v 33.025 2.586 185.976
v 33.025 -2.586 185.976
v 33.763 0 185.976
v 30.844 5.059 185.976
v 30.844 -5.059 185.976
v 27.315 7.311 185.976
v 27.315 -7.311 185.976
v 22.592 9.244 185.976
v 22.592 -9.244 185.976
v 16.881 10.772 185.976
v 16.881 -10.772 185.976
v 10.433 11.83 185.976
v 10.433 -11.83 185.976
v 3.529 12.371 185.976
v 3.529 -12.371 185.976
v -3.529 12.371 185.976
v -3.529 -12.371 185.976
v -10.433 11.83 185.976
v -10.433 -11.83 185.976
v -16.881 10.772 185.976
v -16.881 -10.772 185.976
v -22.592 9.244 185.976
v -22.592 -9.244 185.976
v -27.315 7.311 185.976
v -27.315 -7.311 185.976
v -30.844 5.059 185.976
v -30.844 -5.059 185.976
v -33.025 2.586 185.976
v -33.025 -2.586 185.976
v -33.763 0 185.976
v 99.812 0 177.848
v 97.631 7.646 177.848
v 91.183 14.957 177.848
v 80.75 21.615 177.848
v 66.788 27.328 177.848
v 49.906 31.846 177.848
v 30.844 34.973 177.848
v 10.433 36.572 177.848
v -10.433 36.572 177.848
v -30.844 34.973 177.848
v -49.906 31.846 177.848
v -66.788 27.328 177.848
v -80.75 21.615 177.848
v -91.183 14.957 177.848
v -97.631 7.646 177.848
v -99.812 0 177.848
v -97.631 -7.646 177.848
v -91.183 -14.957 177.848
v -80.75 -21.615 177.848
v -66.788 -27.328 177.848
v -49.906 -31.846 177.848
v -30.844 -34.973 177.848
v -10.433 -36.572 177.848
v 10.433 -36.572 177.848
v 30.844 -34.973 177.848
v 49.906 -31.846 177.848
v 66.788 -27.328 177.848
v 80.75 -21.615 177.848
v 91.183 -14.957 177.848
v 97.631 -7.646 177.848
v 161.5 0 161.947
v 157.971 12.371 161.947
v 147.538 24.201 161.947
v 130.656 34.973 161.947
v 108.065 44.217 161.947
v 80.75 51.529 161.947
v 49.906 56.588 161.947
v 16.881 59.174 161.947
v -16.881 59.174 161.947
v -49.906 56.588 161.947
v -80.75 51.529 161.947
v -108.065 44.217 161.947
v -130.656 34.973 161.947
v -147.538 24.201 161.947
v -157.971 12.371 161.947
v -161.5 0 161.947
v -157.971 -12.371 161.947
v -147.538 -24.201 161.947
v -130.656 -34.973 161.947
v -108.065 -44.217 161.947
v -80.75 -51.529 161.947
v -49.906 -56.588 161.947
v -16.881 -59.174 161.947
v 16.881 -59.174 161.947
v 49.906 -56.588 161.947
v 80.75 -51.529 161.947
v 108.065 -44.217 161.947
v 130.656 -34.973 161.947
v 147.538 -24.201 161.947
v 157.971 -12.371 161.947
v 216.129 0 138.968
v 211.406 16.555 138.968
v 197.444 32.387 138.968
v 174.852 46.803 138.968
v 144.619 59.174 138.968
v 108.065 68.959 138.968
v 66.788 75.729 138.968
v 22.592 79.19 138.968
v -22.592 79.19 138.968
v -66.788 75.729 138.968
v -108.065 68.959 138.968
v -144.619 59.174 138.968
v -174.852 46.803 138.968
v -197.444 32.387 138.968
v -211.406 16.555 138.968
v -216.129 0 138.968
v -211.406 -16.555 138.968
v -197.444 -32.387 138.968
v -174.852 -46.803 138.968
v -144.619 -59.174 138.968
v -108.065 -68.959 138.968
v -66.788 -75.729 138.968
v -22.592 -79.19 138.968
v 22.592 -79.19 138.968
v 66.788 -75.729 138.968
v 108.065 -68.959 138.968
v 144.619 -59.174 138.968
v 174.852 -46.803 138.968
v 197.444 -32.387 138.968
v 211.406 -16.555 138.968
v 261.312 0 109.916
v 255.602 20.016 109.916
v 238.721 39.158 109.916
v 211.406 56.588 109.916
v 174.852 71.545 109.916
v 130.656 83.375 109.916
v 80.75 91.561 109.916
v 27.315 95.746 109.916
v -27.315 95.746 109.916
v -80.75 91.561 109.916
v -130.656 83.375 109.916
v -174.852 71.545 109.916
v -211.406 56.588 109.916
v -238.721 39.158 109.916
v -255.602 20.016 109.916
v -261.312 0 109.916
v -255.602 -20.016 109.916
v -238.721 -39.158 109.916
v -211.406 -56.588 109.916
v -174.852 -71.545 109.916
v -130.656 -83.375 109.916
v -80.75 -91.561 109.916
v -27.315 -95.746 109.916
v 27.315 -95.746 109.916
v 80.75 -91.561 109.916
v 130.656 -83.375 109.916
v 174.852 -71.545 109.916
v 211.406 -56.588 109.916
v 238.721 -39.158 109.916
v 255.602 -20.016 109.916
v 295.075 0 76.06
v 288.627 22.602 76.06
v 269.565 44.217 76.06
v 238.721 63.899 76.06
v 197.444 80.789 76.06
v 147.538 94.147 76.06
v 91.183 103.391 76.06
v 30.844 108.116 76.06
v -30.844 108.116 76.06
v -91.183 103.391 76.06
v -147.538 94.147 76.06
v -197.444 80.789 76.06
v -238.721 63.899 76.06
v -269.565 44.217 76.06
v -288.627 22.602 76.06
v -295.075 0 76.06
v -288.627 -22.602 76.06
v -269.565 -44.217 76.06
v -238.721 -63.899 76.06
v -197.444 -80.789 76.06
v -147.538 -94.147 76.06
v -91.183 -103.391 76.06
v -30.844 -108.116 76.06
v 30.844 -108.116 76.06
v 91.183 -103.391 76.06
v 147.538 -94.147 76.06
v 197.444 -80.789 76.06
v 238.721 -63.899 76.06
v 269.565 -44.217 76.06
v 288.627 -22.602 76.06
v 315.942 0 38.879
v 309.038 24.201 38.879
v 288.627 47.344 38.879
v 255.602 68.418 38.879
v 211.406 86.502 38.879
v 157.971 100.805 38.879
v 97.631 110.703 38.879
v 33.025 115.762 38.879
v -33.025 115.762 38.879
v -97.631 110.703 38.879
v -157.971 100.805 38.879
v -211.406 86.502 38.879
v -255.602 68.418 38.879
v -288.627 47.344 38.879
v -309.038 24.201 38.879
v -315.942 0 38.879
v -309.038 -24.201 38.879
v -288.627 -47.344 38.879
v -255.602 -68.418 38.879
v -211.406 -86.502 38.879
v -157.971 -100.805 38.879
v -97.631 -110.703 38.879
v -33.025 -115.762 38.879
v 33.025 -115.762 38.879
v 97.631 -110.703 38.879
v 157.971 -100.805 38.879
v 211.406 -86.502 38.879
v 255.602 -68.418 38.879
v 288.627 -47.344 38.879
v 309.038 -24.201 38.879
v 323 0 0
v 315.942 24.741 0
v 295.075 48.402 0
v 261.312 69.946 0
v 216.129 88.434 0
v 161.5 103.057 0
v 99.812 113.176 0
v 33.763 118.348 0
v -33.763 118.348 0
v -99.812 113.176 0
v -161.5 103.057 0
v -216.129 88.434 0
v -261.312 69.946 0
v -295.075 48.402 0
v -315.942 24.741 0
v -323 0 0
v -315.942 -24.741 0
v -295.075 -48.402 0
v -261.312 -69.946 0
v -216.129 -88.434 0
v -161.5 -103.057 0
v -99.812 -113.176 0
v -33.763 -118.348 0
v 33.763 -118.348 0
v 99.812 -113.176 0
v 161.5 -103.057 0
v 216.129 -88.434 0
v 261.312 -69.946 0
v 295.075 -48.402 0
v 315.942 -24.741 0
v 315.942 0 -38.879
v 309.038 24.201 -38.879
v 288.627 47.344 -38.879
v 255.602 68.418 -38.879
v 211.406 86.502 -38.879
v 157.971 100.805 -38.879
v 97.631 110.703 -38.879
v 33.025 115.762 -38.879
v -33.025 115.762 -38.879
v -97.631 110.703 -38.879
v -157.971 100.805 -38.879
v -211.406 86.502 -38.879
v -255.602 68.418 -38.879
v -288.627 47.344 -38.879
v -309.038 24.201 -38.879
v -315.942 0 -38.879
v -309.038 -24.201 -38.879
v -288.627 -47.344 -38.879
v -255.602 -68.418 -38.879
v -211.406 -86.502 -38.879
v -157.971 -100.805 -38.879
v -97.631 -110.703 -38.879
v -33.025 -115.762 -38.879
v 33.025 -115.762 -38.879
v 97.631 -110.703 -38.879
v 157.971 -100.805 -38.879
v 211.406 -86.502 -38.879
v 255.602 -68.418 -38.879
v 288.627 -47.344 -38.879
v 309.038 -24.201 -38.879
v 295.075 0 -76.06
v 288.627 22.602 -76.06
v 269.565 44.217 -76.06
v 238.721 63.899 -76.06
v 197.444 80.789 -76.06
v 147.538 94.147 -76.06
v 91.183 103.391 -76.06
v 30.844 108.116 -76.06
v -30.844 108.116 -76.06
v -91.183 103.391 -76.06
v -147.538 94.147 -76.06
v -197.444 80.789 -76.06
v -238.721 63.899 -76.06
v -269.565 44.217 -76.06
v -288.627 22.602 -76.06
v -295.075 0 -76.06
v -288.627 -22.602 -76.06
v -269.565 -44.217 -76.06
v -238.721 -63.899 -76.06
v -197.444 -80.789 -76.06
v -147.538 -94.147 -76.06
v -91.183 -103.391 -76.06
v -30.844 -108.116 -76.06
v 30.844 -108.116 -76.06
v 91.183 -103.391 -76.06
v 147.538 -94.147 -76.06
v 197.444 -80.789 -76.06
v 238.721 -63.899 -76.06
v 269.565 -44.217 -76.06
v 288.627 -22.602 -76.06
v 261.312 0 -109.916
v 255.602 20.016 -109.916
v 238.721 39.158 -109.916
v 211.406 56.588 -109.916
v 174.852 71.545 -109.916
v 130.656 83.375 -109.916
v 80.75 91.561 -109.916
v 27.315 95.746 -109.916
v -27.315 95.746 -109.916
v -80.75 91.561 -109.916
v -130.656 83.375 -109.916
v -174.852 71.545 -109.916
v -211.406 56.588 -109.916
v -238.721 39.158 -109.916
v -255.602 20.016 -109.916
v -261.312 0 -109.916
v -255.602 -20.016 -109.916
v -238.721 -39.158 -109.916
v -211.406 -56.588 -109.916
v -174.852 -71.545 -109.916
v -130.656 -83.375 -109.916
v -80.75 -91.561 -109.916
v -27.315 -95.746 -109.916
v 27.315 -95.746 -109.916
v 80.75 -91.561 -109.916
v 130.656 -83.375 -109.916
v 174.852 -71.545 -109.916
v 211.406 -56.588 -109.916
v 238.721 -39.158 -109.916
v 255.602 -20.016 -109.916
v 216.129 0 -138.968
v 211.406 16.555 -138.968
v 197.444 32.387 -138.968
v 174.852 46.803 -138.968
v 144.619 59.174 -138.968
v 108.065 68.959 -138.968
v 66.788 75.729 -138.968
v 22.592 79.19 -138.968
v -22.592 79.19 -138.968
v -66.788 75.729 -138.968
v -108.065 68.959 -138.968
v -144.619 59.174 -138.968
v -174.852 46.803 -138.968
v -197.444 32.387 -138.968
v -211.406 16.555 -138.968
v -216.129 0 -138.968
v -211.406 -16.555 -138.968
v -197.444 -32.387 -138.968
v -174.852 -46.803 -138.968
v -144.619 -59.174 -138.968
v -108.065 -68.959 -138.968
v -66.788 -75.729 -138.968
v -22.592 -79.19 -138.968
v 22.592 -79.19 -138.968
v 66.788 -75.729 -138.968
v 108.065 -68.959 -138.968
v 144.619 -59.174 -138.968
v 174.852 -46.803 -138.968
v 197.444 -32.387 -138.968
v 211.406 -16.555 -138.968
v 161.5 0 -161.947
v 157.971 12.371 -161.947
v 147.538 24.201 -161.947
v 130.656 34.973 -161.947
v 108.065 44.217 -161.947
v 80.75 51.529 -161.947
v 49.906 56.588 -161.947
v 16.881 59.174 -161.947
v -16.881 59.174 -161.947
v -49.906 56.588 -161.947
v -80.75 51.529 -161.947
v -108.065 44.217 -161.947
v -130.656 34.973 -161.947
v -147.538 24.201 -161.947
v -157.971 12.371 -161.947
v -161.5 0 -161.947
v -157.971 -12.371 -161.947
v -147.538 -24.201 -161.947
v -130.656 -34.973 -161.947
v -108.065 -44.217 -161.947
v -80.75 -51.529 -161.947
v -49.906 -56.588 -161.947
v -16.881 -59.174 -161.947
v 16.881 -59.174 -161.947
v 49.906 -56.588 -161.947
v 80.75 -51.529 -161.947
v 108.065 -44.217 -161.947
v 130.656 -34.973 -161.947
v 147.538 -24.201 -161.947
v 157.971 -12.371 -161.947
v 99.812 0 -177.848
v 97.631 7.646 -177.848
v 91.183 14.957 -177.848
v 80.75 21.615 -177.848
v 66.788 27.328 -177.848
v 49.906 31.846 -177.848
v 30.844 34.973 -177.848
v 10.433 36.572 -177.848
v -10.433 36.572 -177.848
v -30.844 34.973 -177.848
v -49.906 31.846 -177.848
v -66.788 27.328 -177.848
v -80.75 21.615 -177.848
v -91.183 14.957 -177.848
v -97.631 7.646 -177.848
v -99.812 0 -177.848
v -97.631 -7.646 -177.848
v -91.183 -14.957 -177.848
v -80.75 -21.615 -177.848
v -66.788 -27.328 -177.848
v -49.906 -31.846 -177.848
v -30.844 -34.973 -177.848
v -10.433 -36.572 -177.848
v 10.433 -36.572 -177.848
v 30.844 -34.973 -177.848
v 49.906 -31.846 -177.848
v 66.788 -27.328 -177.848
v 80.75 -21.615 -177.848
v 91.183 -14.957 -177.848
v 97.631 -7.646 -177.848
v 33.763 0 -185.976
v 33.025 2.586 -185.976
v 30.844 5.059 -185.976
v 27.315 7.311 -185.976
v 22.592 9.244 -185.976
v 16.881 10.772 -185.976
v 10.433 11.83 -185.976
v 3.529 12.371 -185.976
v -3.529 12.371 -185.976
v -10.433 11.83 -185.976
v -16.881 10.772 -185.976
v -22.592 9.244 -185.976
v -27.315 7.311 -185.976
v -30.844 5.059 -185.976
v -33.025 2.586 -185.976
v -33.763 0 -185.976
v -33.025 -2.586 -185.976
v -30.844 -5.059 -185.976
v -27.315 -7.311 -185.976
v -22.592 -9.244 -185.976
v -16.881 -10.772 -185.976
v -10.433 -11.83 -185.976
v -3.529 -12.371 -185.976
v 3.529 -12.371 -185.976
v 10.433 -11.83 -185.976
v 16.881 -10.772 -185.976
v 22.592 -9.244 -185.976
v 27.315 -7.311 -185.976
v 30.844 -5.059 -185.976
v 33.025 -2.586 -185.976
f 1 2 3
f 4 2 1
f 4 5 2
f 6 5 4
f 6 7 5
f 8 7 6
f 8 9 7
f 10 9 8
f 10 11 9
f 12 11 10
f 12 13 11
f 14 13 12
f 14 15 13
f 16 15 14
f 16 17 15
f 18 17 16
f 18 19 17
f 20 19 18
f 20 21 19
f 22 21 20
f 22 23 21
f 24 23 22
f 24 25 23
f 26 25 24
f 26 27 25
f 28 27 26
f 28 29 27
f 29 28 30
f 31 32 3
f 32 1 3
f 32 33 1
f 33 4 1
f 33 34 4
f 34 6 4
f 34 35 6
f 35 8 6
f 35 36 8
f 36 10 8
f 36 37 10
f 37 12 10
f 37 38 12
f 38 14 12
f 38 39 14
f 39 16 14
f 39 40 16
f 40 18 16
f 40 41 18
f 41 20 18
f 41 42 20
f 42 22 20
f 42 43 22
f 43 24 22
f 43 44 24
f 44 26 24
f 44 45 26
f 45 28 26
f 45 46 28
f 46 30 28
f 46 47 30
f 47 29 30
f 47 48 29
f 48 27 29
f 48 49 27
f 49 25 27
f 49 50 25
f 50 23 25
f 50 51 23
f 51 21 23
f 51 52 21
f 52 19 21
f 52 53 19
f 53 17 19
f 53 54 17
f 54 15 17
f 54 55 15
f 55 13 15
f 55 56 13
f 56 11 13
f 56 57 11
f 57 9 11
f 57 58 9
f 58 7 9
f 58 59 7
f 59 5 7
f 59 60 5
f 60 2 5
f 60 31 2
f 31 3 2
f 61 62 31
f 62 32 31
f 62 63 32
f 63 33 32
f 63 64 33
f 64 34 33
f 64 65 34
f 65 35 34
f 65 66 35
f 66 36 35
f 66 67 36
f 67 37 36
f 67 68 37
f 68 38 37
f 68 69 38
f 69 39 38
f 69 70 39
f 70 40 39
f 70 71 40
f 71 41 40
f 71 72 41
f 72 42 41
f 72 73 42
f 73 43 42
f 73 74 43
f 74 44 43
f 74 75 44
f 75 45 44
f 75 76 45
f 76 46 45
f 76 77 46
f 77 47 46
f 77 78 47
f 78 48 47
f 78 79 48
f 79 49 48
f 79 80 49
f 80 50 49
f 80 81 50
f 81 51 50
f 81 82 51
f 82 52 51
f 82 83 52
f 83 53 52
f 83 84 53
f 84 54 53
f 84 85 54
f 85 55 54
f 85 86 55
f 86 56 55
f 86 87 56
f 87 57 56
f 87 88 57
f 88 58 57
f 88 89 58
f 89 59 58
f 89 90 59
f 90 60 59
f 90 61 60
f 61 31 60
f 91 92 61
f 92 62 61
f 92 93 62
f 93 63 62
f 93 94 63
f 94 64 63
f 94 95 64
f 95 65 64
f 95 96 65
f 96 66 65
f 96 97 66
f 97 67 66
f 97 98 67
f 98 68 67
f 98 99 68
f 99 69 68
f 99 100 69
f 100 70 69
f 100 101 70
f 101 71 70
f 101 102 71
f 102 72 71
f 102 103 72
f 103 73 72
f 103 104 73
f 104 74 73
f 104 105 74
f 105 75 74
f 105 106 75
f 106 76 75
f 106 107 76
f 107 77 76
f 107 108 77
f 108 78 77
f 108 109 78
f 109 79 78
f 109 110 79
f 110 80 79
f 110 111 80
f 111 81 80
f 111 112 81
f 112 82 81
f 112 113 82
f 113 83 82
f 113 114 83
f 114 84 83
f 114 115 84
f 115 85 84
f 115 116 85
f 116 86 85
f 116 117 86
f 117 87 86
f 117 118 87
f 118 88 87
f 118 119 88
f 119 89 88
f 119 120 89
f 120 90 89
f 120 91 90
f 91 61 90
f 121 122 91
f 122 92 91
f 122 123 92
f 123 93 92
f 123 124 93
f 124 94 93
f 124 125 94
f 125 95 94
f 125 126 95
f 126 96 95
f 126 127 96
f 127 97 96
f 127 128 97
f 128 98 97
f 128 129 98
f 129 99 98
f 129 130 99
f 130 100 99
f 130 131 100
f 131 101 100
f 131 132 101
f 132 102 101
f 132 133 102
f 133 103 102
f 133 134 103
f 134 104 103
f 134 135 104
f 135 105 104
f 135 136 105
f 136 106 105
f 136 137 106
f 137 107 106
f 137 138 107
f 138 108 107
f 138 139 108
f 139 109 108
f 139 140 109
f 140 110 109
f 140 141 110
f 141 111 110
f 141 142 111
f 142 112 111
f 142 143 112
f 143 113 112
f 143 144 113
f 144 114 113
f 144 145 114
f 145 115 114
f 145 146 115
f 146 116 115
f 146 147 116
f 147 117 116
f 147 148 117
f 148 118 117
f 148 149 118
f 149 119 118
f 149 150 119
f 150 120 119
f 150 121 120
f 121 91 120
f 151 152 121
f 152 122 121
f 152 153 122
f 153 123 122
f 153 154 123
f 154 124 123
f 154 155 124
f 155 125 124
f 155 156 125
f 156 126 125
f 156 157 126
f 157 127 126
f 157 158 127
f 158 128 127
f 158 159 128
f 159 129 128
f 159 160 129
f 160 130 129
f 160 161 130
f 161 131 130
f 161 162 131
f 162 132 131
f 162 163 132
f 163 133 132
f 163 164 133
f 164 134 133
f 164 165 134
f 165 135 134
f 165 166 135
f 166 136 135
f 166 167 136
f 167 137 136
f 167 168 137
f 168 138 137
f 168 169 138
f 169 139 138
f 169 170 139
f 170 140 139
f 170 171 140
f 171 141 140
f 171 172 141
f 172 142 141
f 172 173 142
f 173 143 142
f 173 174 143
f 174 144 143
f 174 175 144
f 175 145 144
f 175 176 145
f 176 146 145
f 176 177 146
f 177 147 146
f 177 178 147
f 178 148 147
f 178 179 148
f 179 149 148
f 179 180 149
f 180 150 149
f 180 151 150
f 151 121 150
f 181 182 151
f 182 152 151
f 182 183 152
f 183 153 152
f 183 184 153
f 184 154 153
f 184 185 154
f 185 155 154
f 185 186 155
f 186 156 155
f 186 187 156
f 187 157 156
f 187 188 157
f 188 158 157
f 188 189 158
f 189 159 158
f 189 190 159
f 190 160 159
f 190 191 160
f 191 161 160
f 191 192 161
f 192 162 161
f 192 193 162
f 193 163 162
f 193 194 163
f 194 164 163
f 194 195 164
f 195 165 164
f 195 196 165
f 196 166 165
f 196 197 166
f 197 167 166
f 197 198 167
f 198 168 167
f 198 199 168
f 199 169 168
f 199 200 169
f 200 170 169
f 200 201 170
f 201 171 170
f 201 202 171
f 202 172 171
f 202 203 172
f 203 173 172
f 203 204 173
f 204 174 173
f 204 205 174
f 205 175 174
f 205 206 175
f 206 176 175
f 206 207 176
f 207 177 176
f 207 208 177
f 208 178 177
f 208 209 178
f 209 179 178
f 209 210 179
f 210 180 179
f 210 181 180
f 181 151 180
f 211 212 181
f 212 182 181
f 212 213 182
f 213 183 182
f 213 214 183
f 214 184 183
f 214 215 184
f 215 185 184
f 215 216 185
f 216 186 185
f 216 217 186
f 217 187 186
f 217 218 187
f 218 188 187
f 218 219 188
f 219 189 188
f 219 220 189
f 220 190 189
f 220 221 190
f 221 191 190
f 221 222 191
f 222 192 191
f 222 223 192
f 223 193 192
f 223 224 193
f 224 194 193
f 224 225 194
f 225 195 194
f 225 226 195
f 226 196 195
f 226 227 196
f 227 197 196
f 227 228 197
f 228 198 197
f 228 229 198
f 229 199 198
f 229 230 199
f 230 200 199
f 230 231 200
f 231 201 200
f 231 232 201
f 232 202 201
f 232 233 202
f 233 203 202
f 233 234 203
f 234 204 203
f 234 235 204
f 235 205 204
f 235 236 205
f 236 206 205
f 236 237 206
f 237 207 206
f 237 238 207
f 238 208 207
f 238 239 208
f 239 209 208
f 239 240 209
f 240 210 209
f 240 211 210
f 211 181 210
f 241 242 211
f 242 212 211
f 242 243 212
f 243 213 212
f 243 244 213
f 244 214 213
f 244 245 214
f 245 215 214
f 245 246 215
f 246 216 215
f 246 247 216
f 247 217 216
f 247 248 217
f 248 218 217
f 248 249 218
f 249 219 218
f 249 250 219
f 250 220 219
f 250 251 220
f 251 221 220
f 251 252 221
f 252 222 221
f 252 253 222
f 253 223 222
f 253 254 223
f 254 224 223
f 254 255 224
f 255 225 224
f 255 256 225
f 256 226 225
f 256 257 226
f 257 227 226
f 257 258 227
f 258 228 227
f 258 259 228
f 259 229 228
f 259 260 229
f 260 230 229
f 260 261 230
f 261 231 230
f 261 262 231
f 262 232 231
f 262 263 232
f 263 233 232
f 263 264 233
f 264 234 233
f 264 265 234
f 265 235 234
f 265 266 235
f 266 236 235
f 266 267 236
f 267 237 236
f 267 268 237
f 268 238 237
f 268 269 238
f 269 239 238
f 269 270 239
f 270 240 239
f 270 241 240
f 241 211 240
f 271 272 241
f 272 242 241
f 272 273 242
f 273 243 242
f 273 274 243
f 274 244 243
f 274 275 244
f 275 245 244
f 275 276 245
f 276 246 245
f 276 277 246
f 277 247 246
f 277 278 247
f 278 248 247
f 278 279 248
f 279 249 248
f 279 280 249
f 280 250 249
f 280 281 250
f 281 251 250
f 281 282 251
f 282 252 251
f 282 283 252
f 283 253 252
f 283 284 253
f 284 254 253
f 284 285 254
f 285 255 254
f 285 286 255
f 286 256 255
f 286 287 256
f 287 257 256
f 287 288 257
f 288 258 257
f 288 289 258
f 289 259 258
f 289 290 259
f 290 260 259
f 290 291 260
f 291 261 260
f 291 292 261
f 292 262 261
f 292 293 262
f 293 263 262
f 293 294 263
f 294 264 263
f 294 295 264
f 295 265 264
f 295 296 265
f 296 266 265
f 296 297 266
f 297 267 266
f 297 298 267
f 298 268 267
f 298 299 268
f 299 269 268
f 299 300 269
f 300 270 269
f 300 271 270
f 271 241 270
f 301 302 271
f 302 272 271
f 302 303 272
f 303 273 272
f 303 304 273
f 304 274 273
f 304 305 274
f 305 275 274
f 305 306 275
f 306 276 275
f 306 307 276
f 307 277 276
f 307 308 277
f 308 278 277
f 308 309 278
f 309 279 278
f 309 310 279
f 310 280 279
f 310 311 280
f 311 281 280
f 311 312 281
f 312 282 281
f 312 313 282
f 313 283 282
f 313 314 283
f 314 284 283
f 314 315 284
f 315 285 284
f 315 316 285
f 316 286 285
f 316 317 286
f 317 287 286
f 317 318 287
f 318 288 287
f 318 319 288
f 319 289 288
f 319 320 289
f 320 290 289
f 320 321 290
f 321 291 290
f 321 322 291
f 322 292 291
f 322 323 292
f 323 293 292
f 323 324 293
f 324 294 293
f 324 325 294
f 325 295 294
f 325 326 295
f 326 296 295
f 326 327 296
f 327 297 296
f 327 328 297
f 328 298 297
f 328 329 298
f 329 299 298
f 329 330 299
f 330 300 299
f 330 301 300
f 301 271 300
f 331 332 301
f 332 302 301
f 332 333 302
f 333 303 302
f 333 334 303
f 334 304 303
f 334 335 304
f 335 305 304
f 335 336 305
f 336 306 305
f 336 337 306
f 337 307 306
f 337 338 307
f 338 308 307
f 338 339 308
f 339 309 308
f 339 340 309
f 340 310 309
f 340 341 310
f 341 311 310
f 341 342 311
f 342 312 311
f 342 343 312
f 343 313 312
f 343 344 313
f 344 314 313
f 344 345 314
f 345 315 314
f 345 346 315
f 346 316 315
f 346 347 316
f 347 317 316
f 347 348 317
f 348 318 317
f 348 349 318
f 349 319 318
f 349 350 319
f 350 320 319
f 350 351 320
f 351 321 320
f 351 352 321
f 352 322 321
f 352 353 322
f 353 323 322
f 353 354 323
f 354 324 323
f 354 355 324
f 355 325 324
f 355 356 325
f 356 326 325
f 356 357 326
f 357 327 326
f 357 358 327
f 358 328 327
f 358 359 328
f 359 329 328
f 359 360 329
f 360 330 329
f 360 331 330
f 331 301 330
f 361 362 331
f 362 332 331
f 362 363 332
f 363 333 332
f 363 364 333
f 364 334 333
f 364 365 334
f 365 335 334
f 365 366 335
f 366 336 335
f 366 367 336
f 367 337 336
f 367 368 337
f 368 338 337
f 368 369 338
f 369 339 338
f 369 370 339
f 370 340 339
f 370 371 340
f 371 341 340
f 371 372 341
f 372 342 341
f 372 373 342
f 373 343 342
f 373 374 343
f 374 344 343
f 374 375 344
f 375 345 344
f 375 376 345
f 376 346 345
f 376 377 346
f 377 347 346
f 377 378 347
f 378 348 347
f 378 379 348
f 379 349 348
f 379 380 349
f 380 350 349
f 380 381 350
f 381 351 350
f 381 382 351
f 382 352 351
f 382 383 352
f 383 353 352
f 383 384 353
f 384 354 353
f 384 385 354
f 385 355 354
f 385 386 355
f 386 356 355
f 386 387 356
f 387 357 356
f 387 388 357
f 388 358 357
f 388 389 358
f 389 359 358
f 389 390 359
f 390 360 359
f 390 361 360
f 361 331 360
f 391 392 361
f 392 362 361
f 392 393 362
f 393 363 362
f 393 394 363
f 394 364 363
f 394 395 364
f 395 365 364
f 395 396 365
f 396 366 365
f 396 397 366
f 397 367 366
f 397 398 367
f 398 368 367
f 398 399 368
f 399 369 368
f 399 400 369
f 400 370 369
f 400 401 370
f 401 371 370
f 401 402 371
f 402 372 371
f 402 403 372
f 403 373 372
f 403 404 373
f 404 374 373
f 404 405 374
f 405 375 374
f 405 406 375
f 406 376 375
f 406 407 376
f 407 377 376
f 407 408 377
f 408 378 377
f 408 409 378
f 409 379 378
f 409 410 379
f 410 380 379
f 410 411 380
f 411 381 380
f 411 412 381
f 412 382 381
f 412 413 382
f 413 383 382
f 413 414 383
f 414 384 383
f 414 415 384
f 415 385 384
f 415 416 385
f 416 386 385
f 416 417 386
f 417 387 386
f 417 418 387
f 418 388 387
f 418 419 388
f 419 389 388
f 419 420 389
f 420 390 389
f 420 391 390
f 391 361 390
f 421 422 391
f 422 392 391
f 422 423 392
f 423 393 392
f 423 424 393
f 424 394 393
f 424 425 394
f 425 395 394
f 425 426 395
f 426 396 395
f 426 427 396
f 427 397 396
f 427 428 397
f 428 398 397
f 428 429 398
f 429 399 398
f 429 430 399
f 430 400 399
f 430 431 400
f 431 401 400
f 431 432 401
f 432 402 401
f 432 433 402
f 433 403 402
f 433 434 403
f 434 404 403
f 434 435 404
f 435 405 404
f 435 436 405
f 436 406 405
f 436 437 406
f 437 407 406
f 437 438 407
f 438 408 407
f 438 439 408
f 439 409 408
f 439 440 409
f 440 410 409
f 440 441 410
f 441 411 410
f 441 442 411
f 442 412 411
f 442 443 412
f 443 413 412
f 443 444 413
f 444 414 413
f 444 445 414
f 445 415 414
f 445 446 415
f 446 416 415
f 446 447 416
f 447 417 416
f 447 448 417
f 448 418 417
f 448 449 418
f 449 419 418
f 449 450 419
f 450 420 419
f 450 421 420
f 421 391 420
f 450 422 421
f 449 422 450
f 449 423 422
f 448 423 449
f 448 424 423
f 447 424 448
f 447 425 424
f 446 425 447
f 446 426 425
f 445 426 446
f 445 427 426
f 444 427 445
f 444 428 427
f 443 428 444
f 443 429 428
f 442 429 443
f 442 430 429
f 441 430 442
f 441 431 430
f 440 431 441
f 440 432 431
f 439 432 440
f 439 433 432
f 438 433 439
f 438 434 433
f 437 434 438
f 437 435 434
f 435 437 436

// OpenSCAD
// Generated by SolidPython 1.0.1 on 2020-07-29 00:46:53


scale(v = [19, 7, 11]) {
	sphere(r = 17);
}
/***********************************************
*********      SolidPython code:      **********
************************************************
 
# import packages: SolidPython
from solid import *
from solid.utils import *
from itertools import chain, combinations, permutations


class Resize:

    def __init__(self, scad_file):
        self.scad_file = scad_file
        #self.scad_file = import_scad(scad_file)
        # cone/cylinder param:
        self.r1 = 0
        self.r2 = 0
        self.h = 0
        # rectangular prism param:
        self.w = 0
        self.l = 0
        # ellipse param:
        self.r = 0

    # import OpenScad code (file name corresponds to shape)


    # classify shape + parameters
    def assign(self, param1, param2, param3):
        if self.scad_file == 'cone.scad':
            self.r1 = param1
            self.r2 = param2
            self.h = param3
        elif self.scad_file == 'cylinder.scad':
            self.r1 = param1
            self.r2 = param2
            self.h = param3
        elif self.scad_file == 'rectangularPrism.scad':
            self.h = param1
            self.l = param2
            self.w = param3
        else:
            self.r = param1
            self.h = param2

    # resize parameters
    def iterate(self):
        x = range(3, 20, 2)
        i = 1
        if self.scad_file == 'cone.scad':
            tempList = list(permutations(x, 2))
            for temp in tempList:
                param1 = temp[0]
                param2 = temp[1]
                filepath = 'produced_scad_files/' + 'cone' + str(param1) + '_' + str(param2) + '_' + '.scad'
                scad_render_to_file(cylinder(h=param1, r1=param2, r2=0), filepath)

        elif self.scad_file == 'cylinder.scad':
            tempList = list(permutations(x, 3))
            for temp in tempList:
                param1 = temp[0]
                param2 = temp[1]
                filepath = 'produced_scad_files/' + 'cylinder' + str(param1) + '_' + str(param2) + '_' + '.scad'
                scad_render_to_file(cylinder(h=param1, r1=param2, r2=param2), filepath)

        elif self.scad_file == 'rectangularPrism.scad':
            tempList = list(permutations(x, 3))
            for temp in tempList:
                param1 = temp[0]
                param2 = temp[1]
                param3 = temp[2]
                filepath = 'produced_scad_files/' + 'rectangularPrism' + str(param1) + '_' + str(param2) + '_' + str(
                    param3) + '.scad'
                scad_render_to_file(cube(size=(param1, param2, param3)), filepath)

        elif self.scad_file == 'ellipse.scad':
            tempList = list(permutations(x, 4))
            for temp in tempList:
                param1 = temp[0]
                param2 = temp[1]
                param3 = temp[2]
                param4 = temp[3]
                filepath = 'produced_scad_files/' + 'ellipse' + str(param1) + '_' + str(param2) + '_' + str(param3) + '_' + str(param4) + '.scad'
                scad_render_to_file(scale([param1, param2, param3])(sphere(r=param4)), filepath)

    def render_to_scadfile(self):
        scad_render_to_file(scad, 'example.scad') 
 
************************************************/
